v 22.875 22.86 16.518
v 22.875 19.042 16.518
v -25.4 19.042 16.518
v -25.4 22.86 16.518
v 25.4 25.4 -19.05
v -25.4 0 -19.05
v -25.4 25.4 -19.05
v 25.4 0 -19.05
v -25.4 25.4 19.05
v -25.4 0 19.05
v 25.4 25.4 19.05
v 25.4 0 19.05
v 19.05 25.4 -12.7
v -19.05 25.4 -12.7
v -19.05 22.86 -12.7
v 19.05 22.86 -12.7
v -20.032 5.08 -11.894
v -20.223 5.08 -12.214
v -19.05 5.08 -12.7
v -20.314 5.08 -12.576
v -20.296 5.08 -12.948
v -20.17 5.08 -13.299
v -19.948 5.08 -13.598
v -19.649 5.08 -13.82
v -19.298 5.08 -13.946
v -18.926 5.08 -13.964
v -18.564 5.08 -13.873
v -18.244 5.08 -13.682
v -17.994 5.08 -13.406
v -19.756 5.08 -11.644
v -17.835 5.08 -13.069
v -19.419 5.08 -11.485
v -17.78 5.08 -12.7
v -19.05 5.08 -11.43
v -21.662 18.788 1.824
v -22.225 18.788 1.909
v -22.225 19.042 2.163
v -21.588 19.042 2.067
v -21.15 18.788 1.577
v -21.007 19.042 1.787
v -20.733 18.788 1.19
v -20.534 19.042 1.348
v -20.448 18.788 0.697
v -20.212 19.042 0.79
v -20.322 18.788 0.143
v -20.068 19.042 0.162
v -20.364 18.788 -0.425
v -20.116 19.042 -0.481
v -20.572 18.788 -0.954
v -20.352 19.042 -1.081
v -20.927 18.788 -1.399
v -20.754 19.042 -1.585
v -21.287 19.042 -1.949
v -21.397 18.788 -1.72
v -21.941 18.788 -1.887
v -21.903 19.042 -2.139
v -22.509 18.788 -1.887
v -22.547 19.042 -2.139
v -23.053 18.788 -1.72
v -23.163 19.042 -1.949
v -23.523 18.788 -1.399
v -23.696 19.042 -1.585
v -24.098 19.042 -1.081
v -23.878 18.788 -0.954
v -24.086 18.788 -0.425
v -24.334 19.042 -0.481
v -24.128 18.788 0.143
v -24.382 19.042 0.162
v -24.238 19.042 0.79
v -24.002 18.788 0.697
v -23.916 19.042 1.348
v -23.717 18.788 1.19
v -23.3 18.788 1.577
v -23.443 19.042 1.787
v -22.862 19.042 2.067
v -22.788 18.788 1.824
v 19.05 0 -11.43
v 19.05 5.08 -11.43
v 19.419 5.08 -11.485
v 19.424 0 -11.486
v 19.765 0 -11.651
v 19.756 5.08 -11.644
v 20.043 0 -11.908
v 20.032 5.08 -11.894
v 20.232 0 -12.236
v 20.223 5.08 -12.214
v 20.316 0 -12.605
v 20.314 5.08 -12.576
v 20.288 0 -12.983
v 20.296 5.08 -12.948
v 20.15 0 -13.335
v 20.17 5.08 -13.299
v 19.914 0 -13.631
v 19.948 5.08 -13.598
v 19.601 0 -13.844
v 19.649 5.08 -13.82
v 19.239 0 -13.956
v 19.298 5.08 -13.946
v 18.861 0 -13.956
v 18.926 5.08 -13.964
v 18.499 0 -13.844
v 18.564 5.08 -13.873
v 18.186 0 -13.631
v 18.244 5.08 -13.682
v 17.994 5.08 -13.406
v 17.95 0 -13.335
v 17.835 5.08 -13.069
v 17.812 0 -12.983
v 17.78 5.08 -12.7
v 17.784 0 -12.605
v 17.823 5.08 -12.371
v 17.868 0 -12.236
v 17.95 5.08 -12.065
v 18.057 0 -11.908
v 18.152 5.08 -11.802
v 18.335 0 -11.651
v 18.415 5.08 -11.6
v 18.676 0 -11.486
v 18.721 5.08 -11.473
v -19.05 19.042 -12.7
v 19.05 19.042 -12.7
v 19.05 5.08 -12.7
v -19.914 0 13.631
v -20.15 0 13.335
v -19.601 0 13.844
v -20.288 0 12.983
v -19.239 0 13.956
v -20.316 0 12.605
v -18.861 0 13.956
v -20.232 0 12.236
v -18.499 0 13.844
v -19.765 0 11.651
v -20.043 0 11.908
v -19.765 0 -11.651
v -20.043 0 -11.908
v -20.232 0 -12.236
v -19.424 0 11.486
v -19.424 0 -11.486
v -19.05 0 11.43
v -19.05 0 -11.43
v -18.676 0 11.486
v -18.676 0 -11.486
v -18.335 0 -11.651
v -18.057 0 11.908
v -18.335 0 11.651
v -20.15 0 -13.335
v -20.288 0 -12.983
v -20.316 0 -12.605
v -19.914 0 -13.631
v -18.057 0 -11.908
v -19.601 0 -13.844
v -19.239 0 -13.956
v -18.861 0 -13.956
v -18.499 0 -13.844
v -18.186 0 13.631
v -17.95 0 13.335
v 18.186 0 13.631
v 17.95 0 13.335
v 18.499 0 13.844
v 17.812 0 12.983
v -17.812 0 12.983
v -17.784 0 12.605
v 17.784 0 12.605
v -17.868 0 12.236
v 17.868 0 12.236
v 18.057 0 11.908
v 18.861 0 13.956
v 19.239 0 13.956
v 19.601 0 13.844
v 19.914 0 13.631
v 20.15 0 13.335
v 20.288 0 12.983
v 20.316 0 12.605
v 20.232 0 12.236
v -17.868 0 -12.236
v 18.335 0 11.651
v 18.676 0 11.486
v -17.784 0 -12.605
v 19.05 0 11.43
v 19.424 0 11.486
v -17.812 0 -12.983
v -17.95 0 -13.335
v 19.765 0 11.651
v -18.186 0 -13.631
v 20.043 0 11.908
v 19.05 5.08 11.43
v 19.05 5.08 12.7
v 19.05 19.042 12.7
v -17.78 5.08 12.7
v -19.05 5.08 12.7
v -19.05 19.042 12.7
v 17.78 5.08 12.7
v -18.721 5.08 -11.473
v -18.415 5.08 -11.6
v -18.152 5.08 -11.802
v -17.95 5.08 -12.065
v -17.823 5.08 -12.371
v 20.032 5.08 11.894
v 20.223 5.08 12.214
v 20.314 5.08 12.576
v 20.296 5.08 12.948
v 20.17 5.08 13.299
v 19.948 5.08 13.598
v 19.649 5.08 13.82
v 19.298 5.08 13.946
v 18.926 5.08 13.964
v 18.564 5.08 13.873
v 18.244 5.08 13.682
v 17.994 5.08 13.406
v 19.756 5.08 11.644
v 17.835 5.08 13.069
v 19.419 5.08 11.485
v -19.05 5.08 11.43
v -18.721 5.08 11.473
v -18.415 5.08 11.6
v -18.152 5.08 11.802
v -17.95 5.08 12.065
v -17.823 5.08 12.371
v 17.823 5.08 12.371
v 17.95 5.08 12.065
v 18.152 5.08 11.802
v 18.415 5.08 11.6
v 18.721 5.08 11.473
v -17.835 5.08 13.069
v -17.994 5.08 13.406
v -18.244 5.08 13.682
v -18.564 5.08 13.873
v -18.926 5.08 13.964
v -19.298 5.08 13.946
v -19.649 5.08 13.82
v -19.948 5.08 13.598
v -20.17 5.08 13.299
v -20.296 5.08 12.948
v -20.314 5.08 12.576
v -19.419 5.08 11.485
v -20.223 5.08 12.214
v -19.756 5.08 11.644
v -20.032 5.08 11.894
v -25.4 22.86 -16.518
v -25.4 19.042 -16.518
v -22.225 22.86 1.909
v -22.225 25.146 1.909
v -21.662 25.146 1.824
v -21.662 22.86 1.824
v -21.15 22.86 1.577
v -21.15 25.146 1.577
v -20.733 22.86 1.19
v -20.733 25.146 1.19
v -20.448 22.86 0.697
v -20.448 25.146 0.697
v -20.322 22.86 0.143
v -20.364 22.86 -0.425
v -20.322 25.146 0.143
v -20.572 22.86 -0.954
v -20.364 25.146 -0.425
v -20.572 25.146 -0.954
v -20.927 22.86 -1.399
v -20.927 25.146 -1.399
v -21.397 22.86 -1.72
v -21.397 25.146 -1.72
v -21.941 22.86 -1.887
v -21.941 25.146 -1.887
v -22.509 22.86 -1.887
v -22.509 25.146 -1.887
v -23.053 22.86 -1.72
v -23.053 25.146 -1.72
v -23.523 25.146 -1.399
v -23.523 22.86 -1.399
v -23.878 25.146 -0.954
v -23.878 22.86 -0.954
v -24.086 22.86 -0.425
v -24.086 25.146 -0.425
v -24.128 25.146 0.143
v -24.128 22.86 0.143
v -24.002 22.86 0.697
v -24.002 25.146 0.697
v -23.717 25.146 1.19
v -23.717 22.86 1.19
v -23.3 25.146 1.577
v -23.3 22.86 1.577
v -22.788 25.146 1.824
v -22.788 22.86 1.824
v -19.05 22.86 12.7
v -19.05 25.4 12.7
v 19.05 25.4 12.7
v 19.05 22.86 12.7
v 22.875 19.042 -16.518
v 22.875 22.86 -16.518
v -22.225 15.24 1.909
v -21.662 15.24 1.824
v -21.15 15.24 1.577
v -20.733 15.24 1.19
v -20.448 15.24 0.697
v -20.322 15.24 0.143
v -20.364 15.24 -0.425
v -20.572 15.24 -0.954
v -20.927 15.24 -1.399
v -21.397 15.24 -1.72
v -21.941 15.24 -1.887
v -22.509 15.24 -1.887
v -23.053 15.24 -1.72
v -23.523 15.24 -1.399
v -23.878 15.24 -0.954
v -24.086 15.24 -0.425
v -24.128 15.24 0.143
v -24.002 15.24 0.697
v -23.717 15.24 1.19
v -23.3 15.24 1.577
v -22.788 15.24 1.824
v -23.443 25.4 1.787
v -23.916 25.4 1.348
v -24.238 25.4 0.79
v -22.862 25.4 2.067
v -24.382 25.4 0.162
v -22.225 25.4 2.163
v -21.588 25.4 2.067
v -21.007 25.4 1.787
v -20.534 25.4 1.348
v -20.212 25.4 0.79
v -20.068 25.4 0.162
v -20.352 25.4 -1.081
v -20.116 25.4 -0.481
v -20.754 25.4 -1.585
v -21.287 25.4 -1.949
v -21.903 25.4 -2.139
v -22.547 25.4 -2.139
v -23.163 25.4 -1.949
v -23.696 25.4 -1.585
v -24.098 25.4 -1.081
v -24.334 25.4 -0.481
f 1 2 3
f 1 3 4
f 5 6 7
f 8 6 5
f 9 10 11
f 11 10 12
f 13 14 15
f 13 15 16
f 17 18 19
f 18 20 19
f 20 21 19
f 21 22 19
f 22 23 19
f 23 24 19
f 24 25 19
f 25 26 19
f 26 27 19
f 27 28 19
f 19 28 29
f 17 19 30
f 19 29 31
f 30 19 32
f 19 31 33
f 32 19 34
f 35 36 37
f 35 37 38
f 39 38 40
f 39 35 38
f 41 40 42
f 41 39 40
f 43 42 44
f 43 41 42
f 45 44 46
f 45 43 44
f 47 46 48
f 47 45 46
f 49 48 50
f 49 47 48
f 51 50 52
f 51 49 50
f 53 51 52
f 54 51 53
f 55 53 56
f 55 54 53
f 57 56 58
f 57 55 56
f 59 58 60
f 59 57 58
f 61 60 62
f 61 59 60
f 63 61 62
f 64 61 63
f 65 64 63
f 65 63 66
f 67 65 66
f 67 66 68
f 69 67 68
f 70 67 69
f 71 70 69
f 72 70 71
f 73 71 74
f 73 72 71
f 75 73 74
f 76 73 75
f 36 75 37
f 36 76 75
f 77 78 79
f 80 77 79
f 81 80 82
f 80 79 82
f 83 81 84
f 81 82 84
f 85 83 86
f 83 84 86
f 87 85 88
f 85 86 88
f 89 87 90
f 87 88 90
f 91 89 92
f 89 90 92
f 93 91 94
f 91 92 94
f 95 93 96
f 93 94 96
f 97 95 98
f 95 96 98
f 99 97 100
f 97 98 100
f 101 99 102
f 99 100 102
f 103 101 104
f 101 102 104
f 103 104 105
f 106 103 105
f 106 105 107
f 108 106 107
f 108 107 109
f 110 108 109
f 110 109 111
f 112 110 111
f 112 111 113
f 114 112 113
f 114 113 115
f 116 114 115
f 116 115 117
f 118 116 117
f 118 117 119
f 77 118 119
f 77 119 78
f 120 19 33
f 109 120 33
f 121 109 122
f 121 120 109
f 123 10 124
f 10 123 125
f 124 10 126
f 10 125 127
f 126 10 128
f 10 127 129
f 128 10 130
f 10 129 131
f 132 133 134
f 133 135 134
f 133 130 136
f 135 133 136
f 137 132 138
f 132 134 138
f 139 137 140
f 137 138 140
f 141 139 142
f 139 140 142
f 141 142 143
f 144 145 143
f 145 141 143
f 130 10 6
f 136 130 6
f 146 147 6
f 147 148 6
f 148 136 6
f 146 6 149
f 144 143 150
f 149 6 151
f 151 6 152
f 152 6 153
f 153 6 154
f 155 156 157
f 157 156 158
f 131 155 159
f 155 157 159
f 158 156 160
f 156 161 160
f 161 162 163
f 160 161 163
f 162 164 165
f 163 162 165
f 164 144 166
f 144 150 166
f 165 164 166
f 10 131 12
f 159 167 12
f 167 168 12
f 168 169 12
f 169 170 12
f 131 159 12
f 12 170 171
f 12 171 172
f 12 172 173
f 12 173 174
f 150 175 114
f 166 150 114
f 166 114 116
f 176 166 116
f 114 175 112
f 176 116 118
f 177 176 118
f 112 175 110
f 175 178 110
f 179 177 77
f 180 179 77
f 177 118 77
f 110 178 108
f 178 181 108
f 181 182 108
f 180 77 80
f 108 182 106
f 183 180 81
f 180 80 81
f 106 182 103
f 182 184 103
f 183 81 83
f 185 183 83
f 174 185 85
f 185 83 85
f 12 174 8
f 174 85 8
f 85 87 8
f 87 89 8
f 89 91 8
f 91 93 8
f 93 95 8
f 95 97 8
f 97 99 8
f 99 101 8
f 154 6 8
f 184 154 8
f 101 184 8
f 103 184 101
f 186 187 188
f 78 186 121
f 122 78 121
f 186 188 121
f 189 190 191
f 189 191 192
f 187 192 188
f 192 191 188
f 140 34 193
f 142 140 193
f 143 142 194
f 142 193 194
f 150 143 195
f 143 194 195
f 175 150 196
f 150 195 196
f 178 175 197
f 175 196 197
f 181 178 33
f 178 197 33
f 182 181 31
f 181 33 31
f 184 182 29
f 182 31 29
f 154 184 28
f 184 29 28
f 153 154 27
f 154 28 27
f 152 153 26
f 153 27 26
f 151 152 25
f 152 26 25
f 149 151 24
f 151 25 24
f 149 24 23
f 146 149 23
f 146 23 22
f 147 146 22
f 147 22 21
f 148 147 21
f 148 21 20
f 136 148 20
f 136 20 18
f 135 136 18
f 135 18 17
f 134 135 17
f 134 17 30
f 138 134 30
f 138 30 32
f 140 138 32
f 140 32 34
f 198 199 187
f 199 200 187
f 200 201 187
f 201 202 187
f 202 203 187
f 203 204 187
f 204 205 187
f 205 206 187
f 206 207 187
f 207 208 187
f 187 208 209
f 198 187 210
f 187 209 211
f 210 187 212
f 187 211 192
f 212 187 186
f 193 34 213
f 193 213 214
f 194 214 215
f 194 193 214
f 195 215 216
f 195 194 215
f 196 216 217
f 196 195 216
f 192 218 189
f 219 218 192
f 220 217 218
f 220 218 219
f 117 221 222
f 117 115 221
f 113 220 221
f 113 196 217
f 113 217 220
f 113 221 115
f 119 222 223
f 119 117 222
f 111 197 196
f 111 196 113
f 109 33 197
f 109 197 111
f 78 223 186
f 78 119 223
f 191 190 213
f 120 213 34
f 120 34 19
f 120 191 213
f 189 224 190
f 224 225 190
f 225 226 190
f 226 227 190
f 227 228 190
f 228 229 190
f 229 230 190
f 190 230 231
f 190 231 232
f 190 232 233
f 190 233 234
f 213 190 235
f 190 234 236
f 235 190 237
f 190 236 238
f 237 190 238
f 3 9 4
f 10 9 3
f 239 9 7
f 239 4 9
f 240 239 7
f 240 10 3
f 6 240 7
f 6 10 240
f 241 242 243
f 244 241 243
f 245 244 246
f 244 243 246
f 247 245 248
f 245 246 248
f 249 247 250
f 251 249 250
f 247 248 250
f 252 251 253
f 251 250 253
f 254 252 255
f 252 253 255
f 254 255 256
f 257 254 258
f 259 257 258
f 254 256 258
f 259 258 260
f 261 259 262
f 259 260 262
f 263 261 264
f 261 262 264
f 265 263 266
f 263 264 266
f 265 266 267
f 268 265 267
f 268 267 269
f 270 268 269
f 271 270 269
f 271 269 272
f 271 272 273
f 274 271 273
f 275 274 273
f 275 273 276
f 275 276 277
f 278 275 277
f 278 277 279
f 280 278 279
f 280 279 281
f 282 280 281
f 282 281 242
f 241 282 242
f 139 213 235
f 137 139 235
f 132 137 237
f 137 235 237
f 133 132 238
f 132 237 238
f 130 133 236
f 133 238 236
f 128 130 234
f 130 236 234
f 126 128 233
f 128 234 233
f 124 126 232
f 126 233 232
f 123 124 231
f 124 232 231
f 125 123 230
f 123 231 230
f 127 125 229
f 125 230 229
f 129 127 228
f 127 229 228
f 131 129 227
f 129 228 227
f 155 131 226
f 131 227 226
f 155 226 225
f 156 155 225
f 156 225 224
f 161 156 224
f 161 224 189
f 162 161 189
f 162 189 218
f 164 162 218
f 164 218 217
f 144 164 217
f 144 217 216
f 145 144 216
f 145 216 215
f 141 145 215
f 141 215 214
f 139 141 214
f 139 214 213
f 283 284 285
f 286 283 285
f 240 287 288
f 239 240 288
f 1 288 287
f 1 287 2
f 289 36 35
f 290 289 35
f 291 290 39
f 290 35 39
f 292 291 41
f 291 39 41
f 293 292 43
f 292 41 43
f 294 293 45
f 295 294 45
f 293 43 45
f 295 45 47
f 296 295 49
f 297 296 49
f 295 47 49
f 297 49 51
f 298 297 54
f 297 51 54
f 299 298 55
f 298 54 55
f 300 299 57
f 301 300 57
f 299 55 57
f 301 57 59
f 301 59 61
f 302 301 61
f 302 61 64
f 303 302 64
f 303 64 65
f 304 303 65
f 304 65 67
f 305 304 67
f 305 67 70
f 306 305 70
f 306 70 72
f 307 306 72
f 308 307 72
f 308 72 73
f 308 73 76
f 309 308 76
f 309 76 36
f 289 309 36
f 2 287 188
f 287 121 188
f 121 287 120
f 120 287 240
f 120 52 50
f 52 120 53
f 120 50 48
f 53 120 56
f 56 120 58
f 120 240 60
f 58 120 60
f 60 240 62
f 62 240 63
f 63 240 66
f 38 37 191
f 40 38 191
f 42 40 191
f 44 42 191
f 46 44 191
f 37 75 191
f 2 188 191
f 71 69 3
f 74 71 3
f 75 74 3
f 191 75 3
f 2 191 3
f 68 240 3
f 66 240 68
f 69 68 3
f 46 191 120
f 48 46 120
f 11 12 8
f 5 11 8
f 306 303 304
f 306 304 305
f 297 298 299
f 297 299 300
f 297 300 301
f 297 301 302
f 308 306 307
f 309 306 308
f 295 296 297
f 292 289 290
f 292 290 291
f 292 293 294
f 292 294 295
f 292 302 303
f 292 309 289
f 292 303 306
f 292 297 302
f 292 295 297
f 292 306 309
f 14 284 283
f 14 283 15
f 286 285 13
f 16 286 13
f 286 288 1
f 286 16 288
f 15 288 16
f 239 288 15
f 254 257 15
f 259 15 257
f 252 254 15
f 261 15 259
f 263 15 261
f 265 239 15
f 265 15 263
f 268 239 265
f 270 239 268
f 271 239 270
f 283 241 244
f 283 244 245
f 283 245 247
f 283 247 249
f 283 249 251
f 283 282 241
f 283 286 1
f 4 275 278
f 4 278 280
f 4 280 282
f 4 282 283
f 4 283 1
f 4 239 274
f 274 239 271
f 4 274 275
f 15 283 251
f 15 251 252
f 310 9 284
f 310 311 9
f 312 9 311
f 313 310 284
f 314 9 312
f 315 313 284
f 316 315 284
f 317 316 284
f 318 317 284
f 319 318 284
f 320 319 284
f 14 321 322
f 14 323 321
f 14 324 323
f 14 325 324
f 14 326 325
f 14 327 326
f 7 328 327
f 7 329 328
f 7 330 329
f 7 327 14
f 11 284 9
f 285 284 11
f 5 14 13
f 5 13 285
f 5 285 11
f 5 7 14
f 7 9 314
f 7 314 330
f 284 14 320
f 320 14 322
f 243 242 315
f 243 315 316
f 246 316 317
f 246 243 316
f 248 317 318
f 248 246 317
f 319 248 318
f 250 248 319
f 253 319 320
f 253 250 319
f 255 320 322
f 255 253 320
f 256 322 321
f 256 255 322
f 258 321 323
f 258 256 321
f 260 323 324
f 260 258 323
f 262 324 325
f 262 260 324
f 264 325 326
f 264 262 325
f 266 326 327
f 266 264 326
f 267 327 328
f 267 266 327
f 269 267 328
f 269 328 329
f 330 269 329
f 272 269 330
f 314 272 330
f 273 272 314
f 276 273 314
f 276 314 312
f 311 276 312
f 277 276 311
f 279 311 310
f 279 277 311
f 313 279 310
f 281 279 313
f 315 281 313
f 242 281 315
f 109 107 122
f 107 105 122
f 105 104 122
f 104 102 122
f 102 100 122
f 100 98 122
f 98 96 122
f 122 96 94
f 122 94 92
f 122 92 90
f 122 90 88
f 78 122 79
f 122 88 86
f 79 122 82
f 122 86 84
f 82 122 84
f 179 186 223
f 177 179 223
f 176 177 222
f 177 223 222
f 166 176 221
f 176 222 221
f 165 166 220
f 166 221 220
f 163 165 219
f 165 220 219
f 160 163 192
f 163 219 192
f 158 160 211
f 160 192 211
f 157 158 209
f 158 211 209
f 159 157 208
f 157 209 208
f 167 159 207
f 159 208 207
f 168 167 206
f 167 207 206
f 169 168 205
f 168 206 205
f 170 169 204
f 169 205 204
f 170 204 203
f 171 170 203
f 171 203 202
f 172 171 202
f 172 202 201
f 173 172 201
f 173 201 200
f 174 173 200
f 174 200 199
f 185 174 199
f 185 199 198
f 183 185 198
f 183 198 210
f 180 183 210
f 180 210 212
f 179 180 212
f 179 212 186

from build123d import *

# Parameters (mm, degrees)
SKETCH1_W           = 50.8
SKETCH1_H           = 38.1
BOSS_EXTRUDE1_DEPTH = 25.4
SKETCH2_W           = 38.1
SKETCH2_H           = 25.4
CUT_EXTRUDE1_DEPTH  = 20.32
SKETCH4_W           = 33.03524
SKETCH4_H           = 3.81762
CUT_EXTRUDE2_DEPTH  = 48.27524
SKETCH5_R           = 1.90881
CUT_EXTRUDE3_DEPTH  = 10.16
CHAMFER1_SIZE       = 0.254
CHAMFER2_SIZE       = 0.254
CUT_EXTRUDE4_REACH  = 39.696
SKETCH15_R          = 1.27


with BuildPart() as part:
    # Sketch1 → Boss-Extrude1 (new body)
    with BuildSketch(Plane(origin=(0, 0, 0), x_dir=(1, 0, 0), z_dir=(0, 1, 0))):
        Rectangle(SKETCH1_W, SKETCH1_H)
    extrude(amount=BOSS_EXTRUDE1_DEPTH)

    # Sketch2 → Cut-Extrude1 (cut)
    with BuildSketch(Plane(origin=(0, 25.4, 0), x_dir=(1, 0, 0), z_dir=(0, 1, 0))):
        Rectangle(SKETCH2_W, SKETCH2_H)
    extrude(amount=-CUT_EXTRUDE1_DEPTH, mode=Mode.SUBTRACT)

    # Sketch4 → Cut-Extrude2 (cut)
    with BuildSketch(Plane.ZY.offset(25.4)):
        with Locations((0, 20.95119)):
            Rectangle(SKETCH4_W, SKETCH4_H)
    extrude(amount=-CUT_EXTRUDE2_DEPTH, mode=Mode.SUBTRACT)

    # Sketch5 → Cut-Extrude3 (cut)
    with BuildSketch(Plane(origin=(0, 25.4, 0), x_dir=(1, 0, 0), z_dir=(0, 1, 0))):
        with Locations(Location((-22.225, 0, 0), (0, 0, 270))):
            Circle(SKETCH5_R)
    extrude(amount=-CUT_EXTRUDE3_DEPTH, mode=Mode.SUBTRACT)

    # Chamfer1
    chamfer1_edges = [part.edges().sort_by_distance(p)[0] for p in [
        (-22.225, 25.4, -1.90881),
    ]]
    chamfer(chamfer1_edges, length=CHAMFER1_SIZE)

    # Chamfer2
    chamfer2_edges = [part.edges().sort_by_distance(p)[0] for p in [
        (-22.225, 19.04238, -1.90881),
    ]]
    chamfer(chamfer2_edges, length=CHAMFER2_SIZE)

    # Sketch15 → Cut-Extrude4 (cut, up to next)
    with BuildSketch(Plane(origin=(0, 5.08, 0), x_dir=(1, 0, 0), z_dir=(0, 1, 0)), mode=Mode.PRIVATE) as cut_extrude4_sk1:
        with Locations(Location((-19.05, 12.7, 0), (0, 0, 270))):
            Circle(SKETCH15_R)
    cut_extrude4_tool1 = extrude(cut_extrude4_sk1.sketch, amount=-CUT_EXTRUDE4_REACH, mode=Mode.PRIVATE) & part.part
    # Sketch15 → Cut-Extrude4 (cut, up to next)
    with BuildSketch(Plane(origin=(0, 5.08, 0), x_dir=(1, 0, 0), z_dir=(0, 1, 0)), mode=Mode.PRIVATE) as cut_extrude4_sk2:
        with Locations(Location((19.05, 12.7, 0), (0, 0, 270))):
            Circle(SKETCH15_R)
    cut_extrude4_tool2 = extrude(cut_extrude4_sk2.sketch, amount=-CUT_EXTRUDE4_REACH, mode=Mode.PRIVATE) & part.part
    # Sketch15 → Cut-Extrude4 (cut, up to next)
    with BuildSketch(Plane(origin=(0, 5.08, 0), x_dir=(1, 0, 0), z_dir=(0, 1, 0)), mode=Mode.PRIVATE) as cut_extrude4_sk3:
        with Locations(Location((-19.05, -12.7, 0), (0, 0, 90))):
            Circle(SKETCH15_R)
    cut_extrude4_tool3 = extrude(cut_extrude4_sk3.sketch, amount=-CUT_EXTRUDE4_REACH, mode=Mode.PRIVATE) & part.part
    # Sketch15 → Cut-Extrude4 (cut, up to next)
    with BuildSketch(Plane(origin=(0, 5.08, 0), x_dir=(1, 0, 0), z_dir=(0, 1, 0)), mode=Mode.PRIVATE) as cut_extrude4_sk4:
        with Locations(Location((19.05, -12.7, 0), (0, 0, 90))):
            Circle(SKETCH15_R)
    cut_extrude4_tool4 = extrude(cut_extrude4_sk4.sketch, amount=-CUT_EXTRUDE4_REACH, mode=Mode.PRIVATE) & part.part
    add(cut_extrude4_tool1.solids().sort_by_distance((-19.05, 5.08, -12.7))[0], mode=Mode.SUBTRACT)
    add(cut_extrude4_tool2.solids().sort_by_distance((19.05, 5.08, -12.7))[0], mode=Mode.SUBTRACT)
    add(cut_extrude4_tool3.solids().sort_by_distance((-19.05, 5.08, 12.7))[0], mode=Mode.SUBTRACT)
    add(cut_extrude4_tool4.solids().sort_by_distance((19.05, 5.08, 12.7))[0], mode=Mode.SUBTRACT)


solid = part.part
